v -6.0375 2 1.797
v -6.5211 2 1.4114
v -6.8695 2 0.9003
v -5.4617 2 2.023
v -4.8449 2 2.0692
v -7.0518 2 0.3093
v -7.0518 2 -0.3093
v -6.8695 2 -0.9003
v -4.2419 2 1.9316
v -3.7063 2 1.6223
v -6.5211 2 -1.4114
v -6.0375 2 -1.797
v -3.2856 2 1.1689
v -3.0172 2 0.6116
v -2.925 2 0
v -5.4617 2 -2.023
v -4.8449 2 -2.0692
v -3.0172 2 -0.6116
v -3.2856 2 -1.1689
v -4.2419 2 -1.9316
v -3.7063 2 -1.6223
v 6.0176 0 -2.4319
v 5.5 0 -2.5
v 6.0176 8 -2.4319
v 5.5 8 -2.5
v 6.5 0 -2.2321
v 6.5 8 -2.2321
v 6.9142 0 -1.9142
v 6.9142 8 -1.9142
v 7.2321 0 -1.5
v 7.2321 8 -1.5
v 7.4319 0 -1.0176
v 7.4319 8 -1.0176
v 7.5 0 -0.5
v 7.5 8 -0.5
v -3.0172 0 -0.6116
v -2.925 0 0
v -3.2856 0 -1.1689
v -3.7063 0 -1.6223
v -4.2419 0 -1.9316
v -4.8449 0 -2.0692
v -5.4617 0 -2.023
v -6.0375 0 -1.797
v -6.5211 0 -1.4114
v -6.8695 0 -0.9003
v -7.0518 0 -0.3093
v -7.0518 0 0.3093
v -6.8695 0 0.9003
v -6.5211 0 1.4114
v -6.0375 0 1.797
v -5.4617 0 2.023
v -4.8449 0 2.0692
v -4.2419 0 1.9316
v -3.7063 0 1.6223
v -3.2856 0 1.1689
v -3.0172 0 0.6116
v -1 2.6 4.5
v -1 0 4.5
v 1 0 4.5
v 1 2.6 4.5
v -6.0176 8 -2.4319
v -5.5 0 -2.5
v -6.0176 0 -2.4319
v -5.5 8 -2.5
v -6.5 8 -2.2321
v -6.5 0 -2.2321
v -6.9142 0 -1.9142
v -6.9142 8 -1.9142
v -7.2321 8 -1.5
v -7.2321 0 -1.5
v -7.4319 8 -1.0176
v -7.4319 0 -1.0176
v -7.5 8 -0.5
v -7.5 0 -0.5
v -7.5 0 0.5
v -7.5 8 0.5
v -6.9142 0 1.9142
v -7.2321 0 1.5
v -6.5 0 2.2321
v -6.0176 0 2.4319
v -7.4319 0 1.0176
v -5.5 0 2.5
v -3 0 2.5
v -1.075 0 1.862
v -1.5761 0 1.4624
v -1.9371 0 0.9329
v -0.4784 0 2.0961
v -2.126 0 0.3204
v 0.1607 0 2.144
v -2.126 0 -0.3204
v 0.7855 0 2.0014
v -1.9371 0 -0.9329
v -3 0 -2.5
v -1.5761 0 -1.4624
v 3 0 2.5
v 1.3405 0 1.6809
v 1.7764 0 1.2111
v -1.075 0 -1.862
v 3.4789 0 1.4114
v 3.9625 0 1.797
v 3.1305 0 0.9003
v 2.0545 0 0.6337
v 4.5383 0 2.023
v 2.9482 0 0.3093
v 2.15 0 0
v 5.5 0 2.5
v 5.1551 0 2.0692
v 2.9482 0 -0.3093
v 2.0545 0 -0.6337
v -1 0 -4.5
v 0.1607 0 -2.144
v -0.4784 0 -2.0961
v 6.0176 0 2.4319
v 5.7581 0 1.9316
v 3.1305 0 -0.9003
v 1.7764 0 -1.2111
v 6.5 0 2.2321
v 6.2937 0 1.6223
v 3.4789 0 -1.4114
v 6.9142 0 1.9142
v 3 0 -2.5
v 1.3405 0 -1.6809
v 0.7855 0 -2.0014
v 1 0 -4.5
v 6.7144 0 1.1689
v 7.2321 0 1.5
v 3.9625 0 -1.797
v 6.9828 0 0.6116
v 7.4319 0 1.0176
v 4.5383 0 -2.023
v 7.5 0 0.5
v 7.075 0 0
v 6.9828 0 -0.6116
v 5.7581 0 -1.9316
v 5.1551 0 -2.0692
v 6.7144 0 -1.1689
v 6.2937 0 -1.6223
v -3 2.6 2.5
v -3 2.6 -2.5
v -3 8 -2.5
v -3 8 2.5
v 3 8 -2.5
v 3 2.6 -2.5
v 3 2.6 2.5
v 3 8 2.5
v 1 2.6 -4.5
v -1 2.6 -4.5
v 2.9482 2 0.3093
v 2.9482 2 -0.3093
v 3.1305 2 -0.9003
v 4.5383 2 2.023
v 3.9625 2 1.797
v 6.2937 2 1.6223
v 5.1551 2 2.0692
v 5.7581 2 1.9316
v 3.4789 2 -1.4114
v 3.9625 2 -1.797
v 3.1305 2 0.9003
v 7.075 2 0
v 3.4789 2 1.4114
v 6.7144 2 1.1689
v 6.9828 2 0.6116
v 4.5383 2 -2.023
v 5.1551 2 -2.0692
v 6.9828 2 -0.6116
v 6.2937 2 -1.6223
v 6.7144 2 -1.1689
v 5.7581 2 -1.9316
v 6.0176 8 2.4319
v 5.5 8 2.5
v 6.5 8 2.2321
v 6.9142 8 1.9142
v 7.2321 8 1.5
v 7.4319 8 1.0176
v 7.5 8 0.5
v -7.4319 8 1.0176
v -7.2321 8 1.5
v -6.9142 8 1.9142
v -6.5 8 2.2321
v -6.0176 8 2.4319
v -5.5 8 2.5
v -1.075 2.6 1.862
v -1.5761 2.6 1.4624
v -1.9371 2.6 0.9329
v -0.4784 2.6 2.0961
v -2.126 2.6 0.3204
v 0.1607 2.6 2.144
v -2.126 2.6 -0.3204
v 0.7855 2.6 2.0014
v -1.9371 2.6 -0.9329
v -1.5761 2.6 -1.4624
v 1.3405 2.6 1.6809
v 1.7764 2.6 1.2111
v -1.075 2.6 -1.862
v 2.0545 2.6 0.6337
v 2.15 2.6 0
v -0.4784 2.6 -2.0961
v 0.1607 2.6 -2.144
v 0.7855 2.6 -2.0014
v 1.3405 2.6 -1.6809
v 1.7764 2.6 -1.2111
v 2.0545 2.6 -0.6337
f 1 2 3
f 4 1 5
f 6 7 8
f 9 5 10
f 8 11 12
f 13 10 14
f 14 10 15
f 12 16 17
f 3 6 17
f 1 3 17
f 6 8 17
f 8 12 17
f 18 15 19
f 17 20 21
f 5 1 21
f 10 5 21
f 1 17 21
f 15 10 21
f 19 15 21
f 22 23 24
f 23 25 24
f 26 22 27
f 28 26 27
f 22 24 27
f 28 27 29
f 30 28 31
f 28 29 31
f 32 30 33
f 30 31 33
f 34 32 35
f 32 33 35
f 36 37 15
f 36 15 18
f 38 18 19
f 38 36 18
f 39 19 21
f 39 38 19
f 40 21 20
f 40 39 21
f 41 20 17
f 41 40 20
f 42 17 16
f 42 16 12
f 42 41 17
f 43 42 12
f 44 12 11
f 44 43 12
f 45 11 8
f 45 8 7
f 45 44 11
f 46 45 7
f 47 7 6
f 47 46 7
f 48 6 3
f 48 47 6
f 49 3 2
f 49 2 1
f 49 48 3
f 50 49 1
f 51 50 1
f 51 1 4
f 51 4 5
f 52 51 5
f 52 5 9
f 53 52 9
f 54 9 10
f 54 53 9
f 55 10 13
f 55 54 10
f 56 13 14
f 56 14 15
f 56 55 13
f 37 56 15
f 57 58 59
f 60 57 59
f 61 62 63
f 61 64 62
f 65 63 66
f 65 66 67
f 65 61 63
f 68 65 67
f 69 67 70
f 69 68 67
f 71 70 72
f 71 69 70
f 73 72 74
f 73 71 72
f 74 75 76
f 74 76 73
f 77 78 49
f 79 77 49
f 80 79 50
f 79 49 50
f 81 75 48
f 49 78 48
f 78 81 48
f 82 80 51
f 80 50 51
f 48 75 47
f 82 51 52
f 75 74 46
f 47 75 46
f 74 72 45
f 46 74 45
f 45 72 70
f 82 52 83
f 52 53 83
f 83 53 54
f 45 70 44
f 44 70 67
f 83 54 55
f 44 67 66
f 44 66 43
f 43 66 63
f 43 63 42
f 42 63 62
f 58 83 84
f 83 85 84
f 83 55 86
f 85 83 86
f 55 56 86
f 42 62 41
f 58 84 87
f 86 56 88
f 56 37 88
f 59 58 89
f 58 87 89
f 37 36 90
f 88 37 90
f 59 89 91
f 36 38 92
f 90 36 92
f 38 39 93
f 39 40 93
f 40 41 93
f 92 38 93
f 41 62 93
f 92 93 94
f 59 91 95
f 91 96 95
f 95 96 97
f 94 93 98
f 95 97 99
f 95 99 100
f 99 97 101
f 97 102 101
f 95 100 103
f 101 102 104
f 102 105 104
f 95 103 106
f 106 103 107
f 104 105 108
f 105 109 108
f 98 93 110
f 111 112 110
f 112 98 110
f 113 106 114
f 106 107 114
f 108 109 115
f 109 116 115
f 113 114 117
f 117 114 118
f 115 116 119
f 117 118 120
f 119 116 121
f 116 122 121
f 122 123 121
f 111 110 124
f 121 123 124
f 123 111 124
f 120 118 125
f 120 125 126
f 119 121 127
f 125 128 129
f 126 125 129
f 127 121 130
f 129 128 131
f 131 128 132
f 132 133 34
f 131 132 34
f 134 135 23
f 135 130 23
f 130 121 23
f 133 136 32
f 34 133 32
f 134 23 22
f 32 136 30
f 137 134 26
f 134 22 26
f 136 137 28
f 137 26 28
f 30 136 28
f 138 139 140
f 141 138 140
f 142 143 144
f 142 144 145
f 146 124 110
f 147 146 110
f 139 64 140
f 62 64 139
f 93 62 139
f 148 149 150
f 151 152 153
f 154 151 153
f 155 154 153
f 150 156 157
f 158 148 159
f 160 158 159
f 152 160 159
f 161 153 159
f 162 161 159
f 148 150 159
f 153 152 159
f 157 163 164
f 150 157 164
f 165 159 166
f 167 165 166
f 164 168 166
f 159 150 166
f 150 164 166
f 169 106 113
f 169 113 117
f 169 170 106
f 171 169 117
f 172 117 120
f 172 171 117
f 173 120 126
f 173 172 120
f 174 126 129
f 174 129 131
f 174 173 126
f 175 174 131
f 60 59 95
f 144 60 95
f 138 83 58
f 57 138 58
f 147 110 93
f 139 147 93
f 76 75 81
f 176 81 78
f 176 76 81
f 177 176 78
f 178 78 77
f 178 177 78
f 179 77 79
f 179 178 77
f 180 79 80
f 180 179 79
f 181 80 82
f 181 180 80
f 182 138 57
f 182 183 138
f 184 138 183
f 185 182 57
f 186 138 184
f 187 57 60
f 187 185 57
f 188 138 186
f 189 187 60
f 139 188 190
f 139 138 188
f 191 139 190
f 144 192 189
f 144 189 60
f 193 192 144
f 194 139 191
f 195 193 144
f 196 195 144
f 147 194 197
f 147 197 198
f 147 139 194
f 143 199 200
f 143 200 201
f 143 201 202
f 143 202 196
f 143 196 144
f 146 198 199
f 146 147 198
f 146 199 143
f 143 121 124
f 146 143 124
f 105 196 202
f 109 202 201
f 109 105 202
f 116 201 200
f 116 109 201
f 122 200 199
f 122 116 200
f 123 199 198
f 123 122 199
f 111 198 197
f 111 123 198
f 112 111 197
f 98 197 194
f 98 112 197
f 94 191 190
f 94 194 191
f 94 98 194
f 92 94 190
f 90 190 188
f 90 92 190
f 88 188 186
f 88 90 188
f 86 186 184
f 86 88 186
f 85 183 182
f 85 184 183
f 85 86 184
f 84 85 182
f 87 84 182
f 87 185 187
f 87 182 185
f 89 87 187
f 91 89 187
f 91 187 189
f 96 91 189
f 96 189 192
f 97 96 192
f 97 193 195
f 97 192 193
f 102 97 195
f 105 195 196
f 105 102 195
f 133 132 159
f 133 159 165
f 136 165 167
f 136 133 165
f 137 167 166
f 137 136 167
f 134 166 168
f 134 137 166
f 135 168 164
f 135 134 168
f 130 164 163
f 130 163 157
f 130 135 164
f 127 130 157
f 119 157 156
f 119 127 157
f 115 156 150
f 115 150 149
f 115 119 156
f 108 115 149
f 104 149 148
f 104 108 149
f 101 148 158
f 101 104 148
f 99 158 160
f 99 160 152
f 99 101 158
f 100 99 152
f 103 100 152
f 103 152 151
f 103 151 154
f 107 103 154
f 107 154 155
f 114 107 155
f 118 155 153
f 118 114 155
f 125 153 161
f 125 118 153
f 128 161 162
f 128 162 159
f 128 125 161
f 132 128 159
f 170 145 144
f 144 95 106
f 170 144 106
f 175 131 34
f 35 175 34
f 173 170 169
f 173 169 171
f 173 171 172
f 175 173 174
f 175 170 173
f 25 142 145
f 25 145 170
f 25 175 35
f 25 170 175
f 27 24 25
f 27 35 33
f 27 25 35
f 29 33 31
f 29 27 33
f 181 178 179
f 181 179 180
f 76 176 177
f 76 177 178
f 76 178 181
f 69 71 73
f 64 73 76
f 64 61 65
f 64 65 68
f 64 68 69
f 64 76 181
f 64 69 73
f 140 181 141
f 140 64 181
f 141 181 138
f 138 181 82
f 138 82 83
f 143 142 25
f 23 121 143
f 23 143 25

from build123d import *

# Parameters (mm, degrees)
SKETCH_1_W               = 15
SKETCH_1_H               = 5
SKETCH_1_R               = 2.15
SKETCH_1_R_2             = 2.075
EXTRUDE_1_DEPTH          = 8
SKETCH_1_3_R             = 2.075
CUT_EXTRUDE_1_DEPTH      = 2
SKETCH_2_W               = 3
SKETCH_2_H               = 5.4
CUT_EXTRUDE_2_DEPTH      = 3.5
CUT_EXTRUDE_2_DEPTH_BACK = 3.5
EXTRUDE_2_DEPTH          = 2.6
FILLET_1_R               = 2


with BuildPart() as part:
    # 草图1 → 凸台-拉伸1 (new body)
    with BuildSketch(Plane(origin=(0, 0, 0), x_dir=(1, 0, 0), z_dir=(0, 1, 0))):
        Rectangle(SKETCH_1_W, SKETCH_1_H)
        Circle(SKETCH_1_R, mode=Mode.SUBTRACT)
        with Locations((-5, 0)):
            Circle(SKETCH_1_R_2, mode=Mode.SUBTRACT)
        with Locations((5, 0)):
            Circle(SKETCH_1_R_2, mode=Mode.SUBTRACT)
        with Locations((-5, 0)):
            Circle(SKETCH_1_R_2)
        with Locations((5, 0)):
            Circle(SKETCH_1_R_2)
    extrude(amount=EXTRUDE_1_DEPTH)

    # 草图1<3> → 切除-拉伸1 (cut)
    with BuildSketch(Plane(origin=(0, 0, 0), x_dir=(1, 0, 0), z_dir=(0, 1, 0))):
        with Locations((-5, 0)):
            Circle(SKETCH_1_3_R)
        with Locations((5, 0)):
            Circle(SKETCH_1_3_R)
    extrude(amount=CUT_EXTRUDE_1_DEPTH, mode=Mode.SUBTRACT)

    # 草图2 → 切除-拉伸2 (cut, two sides)
    with BuildSketch(Plane.XY) as cut_extrude_2_sk:
        with Locations((-1.5, 5.3)):
            Rectangle(SKETCH_2_W, SKETCH_2_H)
        with Locations((1.5, 5.3)):
            Rectangle(SKETCH_2_W, SKETCH_2_H)
    extrude(amount=CUT_EXTRUDE_2_DEPTH, mode=Mode.SUBTRACT)
    extrude(cut_extrude_2_sk.sketch, amount=-CUT_EXTRUDE_2_DEPTH_BACK, mode=Mode.SUBTRACT)

    # 草图3 → 凸台-拉伸2 (add)
    with BuildSketch(Plane(origin=(0, 0, 0), x_dir=(1, 0, 0), z_dir=(0, 1, 0))):
        Polygon((-1, 4.5), (-3, 2.5), (0, 2.5), (0, 4.5), align=None)
        Polygon((0, 4.5), (0, 2.5), (3, 2.5), (1, 4.5), align=None)
        Polygon((3, -2.5), (0, -2.5), (0, -4.5), (1, -4.5), align=None)
        Polygon((0, -2.5), (-3, -2.5), (-1, -4.5), (0, -4.5), align=None)
    extrude(amount=EXTRUDE_2_DEPTH)

    # 圆角1
    fillet_1_edges = [part.edges().sort_by_distance(p)[0] for p in [
        (7.5, 4, 2.5),
        (-7.5, 4, 2.5),
        (-7.5, 4, -2.5),
        (7.5, 4, -2.5),
    ]]
    fillet(fillet_1_edges, radius=FILLET_1_R)


solid = part.part
